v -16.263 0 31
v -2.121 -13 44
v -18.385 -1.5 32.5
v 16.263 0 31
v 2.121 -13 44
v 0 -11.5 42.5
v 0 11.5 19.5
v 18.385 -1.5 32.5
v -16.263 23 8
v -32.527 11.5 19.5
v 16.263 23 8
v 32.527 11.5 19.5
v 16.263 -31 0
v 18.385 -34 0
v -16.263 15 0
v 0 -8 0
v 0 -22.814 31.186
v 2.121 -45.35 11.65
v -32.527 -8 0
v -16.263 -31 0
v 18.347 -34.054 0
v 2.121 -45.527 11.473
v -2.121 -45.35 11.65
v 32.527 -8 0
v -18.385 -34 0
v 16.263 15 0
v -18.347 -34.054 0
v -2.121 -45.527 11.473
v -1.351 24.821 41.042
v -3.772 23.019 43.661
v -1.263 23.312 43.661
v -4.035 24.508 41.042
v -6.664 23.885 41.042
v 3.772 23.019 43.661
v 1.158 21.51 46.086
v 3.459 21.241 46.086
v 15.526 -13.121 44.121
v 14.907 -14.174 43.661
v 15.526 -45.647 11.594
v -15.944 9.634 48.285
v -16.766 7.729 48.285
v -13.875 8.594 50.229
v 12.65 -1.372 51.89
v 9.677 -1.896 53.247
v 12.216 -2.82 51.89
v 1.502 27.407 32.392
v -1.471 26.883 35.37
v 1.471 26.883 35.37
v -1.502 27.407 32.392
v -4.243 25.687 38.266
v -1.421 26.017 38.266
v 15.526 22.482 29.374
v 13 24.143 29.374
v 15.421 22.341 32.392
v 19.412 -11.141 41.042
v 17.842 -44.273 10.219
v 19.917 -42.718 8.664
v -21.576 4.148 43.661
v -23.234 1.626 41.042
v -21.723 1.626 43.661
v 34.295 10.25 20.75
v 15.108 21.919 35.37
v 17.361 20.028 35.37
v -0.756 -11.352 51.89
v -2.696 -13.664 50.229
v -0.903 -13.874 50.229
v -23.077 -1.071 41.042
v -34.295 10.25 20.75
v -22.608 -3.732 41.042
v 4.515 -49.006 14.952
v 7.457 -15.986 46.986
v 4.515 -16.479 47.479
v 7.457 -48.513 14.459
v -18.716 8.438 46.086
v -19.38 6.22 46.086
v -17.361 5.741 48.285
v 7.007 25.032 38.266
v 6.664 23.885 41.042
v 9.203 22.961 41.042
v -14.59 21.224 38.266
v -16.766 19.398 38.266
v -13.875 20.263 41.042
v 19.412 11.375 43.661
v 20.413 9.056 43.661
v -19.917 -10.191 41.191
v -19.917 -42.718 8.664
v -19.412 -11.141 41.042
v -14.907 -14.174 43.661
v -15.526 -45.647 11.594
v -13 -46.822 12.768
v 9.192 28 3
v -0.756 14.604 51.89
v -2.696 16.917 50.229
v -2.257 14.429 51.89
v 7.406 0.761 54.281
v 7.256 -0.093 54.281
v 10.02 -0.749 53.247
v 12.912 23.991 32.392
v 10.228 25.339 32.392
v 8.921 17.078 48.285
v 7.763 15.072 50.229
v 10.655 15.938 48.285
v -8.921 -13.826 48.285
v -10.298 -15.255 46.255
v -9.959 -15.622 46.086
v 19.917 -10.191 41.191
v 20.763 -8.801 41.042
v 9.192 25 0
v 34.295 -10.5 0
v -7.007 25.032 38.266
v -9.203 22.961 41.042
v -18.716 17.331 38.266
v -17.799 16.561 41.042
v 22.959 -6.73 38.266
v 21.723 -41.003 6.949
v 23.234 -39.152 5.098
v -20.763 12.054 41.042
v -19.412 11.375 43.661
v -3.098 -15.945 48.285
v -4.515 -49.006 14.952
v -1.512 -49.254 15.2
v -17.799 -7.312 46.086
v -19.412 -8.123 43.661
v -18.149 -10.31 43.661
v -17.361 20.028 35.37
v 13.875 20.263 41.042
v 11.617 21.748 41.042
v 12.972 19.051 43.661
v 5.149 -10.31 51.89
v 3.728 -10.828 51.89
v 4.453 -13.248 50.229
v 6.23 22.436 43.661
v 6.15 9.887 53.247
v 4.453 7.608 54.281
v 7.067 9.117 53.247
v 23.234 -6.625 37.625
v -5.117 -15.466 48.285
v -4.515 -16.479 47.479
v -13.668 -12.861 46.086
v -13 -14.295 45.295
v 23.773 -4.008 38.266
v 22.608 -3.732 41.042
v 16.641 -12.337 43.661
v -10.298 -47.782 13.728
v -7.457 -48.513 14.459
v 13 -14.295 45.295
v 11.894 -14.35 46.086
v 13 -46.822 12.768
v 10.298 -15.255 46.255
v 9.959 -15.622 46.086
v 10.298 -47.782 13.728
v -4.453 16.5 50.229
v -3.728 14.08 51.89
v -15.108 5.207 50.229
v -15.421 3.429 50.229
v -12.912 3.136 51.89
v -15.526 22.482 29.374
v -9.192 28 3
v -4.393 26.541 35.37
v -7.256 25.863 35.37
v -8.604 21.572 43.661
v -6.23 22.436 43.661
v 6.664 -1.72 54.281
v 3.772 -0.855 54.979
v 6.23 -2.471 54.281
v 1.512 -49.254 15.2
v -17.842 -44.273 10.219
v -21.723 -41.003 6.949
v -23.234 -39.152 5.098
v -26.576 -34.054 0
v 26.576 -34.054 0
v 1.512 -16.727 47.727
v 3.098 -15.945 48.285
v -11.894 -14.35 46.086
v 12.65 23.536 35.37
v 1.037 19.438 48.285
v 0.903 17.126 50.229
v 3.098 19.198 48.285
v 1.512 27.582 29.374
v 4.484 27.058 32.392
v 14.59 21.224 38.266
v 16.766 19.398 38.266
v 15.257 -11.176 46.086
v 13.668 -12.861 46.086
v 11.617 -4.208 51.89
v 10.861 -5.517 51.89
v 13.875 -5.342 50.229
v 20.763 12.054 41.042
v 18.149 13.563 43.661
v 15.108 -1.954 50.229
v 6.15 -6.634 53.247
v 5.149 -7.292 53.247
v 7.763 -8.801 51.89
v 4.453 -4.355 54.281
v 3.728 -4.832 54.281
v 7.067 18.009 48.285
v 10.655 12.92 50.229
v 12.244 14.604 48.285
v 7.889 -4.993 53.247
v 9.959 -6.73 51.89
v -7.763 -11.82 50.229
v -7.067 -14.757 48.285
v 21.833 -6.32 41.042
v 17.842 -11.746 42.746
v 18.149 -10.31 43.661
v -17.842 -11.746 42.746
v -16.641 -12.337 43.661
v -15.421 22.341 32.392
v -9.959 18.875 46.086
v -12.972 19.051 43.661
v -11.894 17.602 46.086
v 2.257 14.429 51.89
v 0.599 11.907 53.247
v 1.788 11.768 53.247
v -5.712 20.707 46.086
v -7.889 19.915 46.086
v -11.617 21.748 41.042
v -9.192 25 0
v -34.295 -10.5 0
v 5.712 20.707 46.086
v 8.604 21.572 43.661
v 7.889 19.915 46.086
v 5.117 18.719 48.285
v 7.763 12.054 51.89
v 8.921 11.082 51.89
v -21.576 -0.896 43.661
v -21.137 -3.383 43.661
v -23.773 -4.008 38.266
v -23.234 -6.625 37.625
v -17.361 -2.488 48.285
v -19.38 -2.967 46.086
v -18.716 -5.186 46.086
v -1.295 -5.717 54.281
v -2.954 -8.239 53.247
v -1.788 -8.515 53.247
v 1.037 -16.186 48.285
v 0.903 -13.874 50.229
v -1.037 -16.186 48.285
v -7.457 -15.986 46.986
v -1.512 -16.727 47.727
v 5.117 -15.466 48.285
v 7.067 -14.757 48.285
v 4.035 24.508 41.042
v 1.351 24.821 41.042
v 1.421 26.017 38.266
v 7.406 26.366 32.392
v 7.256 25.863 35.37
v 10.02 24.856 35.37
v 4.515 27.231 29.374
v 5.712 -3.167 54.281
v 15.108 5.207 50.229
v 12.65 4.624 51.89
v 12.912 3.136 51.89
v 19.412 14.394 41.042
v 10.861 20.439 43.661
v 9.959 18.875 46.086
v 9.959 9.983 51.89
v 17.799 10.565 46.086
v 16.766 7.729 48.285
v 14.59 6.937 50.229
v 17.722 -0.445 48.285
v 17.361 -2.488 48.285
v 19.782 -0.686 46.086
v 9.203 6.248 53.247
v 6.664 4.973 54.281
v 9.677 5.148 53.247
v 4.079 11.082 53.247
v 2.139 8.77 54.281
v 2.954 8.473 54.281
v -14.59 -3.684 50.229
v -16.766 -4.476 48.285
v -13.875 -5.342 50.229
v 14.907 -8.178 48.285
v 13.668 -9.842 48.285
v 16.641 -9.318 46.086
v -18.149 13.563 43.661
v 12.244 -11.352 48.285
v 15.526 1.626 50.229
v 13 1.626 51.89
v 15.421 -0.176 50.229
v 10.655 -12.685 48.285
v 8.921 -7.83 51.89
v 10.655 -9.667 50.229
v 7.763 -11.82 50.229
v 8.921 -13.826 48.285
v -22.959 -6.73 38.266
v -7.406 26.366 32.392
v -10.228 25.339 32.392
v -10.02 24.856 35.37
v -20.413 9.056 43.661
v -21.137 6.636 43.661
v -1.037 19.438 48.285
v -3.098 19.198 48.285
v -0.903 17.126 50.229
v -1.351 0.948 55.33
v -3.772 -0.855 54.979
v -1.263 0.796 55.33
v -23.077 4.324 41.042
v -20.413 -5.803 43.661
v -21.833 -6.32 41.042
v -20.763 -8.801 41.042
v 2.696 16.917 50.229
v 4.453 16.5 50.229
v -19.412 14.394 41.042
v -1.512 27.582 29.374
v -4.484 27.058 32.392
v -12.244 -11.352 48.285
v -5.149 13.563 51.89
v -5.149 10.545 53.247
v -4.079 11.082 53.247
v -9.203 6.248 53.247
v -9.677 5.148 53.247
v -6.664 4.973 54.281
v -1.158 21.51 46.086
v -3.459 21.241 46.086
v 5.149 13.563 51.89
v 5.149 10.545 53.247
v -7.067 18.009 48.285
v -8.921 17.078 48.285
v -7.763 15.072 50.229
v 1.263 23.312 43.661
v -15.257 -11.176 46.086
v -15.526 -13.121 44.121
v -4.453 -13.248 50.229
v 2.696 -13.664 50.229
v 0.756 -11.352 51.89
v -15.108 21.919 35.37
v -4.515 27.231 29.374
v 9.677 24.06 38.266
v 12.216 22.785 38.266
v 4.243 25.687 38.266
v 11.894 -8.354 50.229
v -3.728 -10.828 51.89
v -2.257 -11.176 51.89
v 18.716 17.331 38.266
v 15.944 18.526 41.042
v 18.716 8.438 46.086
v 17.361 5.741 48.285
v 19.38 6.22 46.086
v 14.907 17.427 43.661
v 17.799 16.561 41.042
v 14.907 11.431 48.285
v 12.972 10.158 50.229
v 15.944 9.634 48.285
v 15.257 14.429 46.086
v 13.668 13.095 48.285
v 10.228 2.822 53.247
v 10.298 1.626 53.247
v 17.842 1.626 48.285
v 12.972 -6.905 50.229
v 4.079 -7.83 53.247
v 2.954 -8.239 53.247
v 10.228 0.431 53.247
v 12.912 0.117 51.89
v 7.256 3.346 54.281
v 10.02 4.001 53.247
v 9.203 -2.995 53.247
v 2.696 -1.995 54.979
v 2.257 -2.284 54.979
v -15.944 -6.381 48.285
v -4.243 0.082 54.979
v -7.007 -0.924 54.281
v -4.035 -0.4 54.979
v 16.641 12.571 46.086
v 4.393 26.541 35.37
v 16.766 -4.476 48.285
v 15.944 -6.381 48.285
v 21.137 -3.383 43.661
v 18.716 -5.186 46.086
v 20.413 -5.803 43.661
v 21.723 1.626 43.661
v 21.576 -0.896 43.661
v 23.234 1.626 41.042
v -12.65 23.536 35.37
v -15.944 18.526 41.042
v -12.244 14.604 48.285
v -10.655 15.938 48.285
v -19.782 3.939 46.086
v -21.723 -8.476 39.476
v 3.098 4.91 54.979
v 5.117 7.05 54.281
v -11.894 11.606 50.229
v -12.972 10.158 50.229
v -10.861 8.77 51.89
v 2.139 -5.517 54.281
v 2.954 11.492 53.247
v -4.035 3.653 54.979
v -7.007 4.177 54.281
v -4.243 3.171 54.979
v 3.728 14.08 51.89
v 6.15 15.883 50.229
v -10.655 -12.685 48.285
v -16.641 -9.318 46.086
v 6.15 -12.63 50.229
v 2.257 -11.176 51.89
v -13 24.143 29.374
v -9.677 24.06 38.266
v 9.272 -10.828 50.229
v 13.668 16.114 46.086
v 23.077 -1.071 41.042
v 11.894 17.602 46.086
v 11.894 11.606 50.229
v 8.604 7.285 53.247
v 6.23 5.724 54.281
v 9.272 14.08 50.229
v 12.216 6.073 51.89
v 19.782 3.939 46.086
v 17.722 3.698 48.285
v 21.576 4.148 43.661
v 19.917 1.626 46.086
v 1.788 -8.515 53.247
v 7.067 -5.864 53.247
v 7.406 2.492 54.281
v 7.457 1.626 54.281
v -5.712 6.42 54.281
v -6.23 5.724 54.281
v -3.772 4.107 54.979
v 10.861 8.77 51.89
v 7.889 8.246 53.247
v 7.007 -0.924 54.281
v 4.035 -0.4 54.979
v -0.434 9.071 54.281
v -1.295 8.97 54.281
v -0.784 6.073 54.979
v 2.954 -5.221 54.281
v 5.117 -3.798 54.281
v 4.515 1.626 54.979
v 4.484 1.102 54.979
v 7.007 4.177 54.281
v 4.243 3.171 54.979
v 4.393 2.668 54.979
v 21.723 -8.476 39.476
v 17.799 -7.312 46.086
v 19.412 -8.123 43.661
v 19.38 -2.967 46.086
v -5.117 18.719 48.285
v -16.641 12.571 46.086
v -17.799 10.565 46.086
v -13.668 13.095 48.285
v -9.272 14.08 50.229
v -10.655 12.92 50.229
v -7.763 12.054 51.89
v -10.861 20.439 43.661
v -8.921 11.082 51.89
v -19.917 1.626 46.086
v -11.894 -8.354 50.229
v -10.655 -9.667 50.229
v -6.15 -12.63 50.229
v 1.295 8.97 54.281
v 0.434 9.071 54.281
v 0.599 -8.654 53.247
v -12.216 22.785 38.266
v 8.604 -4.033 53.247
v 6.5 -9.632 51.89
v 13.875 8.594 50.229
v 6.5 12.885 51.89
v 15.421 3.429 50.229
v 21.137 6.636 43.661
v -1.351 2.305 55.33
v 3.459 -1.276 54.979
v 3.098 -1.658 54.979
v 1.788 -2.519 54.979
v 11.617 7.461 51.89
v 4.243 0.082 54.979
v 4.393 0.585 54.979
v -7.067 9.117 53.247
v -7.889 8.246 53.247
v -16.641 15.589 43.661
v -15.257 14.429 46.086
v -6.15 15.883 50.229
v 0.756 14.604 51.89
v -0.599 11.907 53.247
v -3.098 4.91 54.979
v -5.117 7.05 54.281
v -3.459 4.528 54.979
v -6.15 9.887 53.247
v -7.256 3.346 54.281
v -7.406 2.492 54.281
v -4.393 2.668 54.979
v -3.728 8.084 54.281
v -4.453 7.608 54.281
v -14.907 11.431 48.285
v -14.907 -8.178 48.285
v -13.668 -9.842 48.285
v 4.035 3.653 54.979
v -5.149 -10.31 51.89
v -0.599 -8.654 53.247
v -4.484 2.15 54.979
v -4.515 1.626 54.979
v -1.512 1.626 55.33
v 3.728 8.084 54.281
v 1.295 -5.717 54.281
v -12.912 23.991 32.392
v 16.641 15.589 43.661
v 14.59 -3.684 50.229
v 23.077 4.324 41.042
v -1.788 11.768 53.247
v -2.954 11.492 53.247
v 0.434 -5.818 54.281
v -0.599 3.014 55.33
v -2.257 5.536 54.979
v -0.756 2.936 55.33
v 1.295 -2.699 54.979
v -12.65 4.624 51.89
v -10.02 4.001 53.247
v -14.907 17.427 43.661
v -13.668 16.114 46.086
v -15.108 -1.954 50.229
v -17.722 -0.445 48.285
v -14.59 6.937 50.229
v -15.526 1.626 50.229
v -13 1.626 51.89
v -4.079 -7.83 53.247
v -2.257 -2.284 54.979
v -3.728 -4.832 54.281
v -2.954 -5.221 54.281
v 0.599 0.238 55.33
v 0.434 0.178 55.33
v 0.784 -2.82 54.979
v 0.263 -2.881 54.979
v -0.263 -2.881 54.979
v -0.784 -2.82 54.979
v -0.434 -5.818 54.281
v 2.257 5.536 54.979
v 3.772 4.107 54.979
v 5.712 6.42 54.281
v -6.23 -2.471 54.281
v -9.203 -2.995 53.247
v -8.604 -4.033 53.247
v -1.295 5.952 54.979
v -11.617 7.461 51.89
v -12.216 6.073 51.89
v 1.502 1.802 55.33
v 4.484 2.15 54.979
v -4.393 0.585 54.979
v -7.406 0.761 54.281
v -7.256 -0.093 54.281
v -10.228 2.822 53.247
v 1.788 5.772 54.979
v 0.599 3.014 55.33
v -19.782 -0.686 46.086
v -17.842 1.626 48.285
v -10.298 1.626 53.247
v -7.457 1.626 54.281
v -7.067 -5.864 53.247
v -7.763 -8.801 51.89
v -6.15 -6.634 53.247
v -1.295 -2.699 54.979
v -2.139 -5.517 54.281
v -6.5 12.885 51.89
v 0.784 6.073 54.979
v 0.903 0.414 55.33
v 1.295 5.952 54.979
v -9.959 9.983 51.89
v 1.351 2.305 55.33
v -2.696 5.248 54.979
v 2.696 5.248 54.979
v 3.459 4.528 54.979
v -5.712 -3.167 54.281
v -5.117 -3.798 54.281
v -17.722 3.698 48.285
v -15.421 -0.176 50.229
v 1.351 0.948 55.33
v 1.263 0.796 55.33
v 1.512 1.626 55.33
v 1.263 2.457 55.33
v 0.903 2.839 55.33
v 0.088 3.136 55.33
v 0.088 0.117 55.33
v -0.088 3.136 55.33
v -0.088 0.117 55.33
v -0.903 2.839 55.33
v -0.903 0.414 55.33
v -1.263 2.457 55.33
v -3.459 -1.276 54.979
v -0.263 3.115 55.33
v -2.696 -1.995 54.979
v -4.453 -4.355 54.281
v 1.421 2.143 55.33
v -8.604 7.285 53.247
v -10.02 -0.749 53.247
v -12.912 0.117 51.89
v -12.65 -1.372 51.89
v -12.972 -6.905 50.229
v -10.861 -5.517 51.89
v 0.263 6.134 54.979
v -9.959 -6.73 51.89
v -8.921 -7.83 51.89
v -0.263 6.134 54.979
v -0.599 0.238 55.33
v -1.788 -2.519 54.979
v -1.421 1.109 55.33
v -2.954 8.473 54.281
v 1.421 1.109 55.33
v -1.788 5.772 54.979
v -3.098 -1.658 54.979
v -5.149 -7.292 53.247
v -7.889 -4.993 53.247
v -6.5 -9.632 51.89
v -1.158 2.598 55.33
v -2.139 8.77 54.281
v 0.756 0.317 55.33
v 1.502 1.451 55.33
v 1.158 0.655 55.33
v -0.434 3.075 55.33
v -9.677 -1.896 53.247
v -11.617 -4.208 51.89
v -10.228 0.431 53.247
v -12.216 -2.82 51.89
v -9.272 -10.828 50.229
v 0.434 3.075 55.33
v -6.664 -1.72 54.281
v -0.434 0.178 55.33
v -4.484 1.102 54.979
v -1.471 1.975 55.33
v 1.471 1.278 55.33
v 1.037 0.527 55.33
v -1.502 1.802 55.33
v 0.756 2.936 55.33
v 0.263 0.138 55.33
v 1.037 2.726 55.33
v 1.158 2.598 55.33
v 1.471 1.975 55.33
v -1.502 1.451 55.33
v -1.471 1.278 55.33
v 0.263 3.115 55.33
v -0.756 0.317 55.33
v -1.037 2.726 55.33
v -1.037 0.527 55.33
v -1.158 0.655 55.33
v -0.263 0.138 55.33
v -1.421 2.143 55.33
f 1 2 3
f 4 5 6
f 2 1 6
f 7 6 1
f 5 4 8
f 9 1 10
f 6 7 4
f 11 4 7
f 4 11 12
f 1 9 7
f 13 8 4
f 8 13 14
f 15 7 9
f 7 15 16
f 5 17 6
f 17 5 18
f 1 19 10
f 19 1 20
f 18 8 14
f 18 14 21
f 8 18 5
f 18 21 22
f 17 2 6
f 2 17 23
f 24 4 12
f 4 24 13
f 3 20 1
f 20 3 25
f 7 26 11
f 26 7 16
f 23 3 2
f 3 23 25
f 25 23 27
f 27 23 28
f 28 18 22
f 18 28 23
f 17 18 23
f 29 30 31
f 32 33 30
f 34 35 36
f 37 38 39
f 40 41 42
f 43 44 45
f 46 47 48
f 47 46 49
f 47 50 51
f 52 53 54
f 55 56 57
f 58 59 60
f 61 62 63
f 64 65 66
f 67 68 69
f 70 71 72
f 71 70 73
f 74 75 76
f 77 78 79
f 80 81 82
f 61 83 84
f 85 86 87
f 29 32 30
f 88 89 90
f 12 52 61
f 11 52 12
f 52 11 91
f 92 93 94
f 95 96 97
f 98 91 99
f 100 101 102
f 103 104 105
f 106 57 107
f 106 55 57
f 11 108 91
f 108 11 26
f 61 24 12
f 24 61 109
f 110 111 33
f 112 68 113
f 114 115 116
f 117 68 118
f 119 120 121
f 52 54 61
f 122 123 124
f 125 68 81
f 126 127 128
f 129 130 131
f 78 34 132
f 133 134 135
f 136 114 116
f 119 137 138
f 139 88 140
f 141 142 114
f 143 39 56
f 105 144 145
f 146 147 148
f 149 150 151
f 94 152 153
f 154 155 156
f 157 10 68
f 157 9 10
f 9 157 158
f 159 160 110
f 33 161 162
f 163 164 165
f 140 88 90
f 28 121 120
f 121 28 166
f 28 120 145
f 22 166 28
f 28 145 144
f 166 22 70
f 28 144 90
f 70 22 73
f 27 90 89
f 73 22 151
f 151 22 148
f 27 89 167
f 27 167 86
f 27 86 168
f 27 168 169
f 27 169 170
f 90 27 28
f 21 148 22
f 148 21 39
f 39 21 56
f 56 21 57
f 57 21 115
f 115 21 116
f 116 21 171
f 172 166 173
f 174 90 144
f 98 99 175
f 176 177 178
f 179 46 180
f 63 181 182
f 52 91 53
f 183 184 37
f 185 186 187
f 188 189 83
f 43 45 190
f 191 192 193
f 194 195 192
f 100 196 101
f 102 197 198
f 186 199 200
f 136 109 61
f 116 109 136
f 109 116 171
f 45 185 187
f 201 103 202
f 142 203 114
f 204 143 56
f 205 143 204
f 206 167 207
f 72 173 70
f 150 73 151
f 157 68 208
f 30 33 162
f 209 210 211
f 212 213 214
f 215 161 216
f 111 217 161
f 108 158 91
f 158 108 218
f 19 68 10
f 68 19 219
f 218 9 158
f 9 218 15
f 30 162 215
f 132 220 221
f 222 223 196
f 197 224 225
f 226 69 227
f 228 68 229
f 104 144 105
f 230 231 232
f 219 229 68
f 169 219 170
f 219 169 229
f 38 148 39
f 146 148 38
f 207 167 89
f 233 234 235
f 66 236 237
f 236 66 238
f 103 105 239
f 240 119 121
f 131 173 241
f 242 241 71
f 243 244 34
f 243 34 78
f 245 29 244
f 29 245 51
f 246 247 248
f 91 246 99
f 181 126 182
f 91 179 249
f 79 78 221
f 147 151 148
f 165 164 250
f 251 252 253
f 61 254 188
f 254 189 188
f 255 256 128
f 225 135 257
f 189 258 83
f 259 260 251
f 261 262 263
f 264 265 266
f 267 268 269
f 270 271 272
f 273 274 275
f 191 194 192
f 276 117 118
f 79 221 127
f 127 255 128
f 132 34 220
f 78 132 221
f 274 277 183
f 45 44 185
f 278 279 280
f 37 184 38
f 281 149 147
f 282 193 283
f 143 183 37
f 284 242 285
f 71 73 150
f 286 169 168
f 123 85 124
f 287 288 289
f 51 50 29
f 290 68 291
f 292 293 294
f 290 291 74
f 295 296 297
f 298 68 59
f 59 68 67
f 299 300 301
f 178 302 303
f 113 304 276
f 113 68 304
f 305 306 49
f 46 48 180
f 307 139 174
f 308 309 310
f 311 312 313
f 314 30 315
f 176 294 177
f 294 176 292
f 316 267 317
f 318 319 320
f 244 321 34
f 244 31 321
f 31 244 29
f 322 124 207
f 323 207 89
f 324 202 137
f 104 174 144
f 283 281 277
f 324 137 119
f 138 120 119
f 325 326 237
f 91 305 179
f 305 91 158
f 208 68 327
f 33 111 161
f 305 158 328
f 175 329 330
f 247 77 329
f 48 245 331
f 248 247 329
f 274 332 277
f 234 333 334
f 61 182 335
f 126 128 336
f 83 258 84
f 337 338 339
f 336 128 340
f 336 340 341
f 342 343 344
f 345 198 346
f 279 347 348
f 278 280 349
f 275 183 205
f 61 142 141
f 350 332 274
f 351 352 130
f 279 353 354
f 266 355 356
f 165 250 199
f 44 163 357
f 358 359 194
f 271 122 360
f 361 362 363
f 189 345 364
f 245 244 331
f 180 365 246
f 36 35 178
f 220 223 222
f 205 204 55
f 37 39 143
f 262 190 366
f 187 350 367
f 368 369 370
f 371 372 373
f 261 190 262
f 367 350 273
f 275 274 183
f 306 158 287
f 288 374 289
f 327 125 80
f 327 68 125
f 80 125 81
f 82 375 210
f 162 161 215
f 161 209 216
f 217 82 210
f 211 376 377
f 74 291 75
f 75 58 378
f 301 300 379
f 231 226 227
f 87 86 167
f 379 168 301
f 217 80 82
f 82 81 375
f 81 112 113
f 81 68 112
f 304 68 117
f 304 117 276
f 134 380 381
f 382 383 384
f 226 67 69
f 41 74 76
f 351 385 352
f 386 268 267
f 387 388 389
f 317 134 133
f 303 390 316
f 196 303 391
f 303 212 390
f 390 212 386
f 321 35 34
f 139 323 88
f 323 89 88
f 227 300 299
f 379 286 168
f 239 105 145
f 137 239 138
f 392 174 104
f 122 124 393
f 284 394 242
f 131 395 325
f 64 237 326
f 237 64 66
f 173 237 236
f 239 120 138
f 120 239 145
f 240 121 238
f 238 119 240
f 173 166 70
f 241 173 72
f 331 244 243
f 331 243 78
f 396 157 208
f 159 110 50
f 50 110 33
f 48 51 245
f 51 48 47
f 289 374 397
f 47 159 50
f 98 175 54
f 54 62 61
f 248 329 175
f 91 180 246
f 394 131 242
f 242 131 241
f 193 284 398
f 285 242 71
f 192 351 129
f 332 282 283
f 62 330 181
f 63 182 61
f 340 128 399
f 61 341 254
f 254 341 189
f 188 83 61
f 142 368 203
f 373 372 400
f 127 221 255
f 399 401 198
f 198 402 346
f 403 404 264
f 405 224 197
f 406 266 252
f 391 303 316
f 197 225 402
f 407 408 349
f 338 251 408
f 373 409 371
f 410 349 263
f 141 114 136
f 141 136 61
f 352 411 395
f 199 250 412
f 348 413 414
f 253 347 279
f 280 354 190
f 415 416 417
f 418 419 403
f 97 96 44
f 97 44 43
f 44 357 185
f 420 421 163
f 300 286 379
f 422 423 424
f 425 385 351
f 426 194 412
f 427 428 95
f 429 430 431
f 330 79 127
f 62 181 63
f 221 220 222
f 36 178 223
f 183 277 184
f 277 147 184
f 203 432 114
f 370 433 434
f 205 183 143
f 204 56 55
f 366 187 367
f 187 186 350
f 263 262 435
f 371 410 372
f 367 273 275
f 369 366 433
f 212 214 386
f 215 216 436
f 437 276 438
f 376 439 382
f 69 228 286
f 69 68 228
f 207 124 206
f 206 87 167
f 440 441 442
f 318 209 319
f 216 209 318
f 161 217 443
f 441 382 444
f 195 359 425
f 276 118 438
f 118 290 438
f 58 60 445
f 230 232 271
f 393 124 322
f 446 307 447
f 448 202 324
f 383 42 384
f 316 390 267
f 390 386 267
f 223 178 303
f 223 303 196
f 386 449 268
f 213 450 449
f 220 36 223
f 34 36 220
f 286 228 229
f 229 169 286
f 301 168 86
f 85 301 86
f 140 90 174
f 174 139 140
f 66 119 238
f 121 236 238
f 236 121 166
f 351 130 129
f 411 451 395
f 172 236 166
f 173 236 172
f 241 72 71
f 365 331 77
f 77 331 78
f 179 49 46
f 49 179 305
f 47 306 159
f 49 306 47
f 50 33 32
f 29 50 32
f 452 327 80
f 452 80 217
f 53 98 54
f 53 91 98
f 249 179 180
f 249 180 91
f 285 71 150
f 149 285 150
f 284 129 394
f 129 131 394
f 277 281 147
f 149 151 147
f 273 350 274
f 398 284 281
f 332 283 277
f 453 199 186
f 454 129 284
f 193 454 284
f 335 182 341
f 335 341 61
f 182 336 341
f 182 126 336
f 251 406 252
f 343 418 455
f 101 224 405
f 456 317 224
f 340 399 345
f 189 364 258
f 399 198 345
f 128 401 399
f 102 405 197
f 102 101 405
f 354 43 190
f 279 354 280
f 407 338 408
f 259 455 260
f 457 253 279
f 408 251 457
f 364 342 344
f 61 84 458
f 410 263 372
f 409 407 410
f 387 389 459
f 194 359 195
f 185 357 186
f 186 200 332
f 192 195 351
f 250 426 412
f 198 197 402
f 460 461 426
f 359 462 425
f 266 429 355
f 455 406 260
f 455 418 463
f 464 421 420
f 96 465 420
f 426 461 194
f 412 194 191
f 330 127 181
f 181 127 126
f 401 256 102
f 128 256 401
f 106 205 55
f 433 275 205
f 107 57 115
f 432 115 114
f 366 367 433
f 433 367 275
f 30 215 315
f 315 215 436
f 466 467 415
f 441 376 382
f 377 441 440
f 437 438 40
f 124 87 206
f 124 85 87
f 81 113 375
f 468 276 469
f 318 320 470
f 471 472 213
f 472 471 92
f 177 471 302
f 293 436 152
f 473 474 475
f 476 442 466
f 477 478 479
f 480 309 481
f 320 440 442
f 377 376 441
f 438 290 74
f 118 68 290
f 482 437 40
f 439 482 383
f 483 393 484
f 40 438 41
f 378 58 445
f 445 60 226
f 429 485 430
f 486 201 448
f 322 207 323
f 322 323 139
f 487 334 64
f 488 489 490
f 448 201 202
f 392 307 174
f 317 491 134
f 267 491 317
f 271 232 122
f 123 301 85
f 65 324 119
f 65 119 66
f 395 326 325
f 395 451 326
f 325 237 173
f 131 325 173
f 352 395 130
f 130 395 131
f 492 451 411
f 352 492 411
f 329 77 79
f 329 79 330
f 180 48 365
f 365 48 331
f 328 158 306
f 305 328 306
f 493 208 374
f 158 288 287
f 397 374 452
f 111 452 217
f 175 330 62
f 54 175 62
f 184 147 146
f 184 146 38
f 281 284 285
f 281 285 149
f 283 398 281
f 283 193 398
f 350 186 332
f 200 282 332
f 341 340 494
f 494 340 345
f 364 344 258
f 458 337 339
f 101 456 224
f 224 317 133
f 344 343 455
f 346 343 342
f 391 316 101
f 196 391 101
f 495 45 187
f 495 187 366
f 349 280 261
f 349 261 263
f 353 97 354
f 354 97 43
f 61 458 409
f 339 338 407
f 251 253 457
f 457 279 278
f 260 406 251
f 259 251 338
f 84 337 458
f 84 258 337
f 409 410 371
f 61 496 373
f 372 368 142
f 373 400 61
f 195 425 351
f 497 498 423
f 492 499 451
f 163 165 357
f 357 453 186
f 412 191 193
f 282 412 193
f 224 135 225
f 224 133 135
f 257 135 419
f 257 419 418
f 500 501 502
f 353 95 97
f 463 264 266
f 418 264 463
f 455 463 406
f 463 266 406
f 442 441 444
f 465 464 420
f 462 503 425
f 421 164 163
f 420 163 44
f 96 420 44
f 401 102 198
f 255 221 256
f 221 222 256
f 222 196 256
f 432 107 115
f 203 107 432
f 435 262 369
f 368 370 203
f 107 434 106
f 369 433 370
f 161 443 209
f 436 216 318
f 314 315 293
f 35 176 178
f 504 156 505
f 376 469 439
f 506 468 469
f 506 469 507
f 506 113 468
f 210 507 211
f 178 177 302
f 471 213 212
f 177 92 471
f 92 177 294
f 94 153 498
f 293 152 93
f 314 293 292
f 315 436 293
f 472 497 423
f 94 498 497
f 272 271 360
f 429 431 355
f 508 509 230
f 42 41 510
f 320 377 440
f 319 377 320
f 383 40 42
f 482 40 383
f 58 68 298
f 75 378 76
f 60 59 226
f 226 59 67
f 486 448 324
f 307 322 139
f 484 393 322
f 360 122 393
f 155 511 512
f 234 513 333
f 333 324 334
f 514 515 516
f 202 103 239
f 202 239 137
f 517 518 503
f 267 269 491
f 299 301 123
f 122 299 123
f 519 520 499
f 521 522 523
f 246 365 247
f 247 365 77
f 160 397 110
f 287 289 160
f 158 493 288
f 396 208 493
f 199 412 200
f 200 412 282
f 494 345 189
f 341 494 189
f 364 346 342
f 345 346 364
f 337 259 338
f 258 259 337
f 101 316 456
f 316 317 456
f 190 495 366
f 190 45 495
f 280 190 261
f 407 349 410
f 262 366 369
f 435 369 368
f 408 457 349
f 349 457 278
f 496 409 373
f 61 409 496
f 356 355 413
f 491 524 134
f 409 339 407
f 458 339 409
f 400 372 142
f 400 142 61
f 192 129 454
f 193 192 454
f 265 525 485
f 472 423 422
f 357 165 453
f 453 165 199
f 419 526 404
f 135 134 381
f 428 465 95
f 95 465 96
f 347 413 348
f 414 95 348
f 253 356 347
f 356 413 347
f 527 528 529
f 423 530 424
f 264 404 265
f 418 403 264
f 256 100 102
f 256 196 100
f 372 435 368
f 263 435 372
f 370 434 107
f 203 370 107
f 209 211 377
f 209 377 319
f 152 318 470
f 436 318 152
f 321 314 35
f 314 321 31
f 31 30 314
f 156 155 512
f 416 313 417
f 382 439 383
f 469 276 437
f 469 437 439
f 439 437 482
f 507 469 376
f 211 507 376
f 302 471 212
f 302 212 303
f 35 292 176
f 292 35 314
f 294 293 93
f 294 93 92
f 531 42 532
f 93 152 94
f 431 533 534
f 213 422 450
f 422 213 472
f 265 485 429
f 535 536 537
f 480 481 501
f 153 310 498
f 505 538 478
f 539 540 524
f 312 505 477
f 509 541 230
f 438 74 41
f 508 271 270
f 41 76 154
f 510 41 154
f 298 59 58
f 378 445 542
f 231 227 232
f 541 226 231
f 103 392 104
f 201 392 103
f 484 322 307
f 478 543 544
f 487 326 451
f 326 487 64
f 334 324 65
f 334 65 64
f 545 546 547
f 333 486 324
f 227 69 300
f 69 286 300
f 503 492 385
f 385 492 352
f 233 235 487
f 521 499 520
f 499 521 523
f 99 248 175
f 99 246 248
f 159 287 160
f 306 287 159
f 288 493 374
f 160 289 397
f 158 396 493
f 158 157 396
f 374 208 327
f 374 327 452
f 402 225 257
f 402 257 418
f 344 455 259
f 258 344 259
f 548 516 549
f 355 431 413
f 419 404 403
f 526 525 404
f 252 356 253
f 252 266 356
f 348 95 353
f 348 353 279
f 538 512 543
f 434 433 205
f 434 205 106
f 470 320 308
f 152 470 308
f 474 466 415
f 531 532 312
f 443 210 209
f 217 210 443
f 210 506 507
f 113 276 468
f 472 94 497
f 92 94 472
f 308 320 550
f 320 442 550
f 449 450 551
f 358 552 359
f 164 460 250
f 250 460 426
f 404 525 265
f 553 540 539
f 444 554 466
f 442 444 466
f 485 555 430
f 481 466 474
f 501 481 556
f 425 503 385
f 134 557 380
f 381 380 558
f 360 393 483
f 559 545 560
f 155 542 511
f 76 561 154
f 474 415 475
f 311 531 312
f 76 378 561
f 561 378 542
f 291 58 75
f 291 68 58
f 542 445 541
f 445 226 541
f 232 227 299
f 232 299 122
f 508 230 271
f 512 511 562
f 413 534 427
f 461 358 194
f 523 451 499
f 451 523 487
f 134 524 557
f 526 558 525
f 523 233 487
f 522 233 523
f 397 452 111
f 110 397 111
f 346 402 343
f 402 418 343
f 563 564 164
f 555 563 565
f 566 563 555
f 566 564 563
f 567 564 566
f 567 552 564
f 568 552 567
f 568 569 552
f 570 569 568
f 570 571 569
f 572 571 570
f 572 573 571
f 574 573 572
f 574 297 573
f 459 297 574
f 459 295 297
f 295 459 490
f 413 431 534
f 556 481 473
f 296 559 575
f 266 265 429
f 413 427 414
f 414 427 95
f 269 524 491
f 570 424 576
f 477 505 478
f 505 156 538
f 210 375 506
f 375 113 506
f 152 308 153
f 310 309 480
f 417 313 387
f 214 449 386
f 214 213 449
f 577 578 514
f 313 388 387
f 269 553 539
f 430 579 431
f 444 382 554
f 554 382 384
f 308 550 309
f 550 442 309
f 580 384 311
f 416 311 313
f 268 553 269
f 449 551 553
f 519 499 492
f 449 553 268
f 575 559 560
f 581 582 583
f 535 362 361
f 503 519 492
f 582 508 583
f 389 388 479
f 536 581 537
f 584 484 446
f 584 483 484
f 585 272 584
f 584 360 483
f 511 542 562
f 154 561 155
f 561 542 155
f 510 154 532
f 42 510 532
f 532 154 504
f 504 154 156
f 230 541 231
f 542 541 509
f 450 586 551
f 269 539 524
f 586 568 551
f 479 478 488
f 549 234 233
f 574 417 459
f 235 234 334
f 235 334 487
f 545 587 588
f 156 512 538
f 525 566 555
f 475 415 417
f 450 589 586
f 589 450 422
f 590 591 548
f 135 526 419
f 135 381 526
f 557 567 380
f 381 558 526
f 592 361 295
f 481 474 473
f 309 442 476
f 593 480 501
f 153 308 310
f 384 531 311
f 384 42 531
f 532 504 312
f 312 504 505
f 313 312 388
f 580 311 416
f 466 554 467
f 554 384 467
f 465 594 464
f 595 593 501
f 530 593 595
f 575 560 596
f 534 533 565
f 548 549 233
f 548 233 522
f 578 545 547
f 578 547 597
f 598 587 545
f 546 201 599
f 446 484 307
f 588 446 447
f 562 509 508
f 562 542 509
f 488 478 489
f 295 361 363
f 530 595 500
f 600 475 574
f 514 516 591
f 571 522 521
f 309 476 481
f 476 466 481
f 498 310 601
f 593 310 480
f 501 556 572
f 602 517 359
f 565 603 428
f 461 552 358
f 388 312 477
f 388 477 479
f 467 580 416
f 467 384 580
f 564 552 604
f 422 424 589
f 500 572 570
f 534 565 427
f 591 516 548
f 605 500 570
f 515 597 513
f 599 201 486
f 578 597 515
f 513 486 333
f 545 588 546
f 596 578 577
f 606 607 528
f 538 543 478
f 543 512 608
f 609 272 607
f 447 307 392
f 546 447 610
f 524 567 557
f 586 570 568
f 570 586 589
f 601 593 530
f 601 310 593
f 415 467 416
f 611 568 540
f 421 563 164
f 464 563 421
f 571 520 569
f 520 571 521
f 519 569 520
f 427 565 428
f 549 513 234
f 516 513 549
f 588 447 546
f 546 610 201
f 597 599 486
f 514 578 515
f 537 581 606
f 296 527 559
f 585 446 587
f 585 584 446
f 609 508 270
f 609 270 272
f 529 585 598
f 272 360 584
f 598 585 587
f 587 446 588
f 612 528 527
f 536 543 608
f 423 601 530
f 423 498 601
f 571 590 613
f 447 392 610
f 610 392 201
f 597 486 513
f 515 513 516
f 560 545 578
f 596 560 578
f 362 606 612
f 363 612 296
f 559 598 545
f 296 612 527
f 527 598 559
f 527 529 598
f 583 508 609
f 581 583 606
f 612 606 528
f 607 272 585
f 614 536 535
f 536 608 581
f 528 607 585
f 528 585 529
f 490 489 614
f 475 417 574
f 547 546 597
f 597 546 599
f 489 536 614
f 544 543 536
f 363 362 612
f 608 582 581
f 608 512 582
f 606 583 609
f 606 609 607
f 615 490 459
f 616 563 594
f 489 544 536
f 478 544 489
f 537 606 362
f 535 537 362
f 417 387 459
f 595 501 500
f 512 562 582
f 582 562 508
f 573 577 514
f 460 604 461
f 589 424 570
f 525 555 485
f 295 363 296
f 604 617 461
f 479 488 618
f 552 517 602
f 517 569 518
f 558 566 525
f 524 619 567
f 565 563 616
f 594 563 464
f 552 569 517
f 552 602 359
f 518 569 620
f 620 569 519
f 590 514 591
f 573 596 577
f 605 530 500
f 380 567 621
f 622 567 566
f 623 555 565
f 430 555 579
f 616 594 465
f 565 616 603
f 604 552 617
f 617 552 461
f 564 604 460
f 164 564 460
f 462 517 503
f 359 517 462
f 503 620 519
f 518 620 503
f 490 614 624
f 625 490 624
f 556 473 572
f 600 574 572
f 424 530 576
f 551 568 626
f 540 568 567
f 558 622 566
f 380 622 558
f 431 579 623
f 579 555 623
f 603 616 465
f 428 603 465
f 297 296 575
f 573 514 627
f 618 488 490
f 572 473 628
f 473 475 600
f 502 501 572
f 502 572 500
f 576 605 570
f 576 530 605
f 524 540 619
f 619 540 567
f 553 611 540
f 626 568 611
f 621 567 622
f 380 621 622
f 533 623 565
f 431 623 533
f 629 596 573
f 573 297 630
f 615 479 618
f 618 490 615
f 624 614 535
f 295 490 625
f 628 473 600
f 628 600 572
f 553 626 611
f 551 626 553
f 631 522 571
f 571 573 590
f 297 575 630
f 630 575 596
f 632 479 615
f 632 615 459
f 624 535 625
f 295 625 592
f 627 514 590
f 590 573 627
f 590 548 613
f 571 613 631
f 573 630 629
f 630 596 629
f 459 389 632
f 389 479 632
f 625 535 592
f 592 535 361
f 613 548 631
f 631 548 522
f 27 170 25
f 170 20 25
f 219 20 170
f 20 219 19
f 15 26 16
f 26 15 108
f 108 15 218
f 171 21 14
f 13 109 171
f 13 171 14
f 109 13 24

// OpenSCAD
left = -1;
right = 1;

board_thickness = 23;
board_offset    = 3;
guard_diam      = 36;
inner_wall      = 10;
side_thickness  = 23;
side_length     = 50;
side_height     = 50;

resolution = 18*3;

module board() {
  translate([0,25,-25])
    cube([side_thickness,side_length,side_height],center=true);
}

module guard() {
  module body() {
    hull() {
      translate([0,board_thickness*.1,0]) {
        rotate([45,0,0])
          sphere(r=26,$fn=resolution);

        translate([0,0,-side_thickness])
          cylinder(r=26,h=side_thickness*2,center=true,$fn=resolution);
      }

      for (side = [left, right]) {
        rotate([0,0,45*side]) {
          translate([inner_wall*.375*side,10+side_thickness-board_thickness/2-inner_wall/2,-side_thickness])
            cube([board_thickness+inner_wall*1.25,side_thickness*2+inner_wall-20,side_thickness*2],center=true);
        }
      }
    }
  }

  module holes() {
    // bed boards
    for (side = [left,right]) {
      rotate([0,0,-45*side])
        translate([0,25-board_thickness/2-3,-side_height/2]) {
          cube([side_thickness,side_length,side_height],center=true);
        }
    }

    hull() {
      for (side = [left,right]) {
        rotate([0,0,-45*side])
          translate([0,-9.5,-side_height])
            cube([side_thickness,10,8.5],center=true);
      }

      rotate([0,0,45])
        translate([-side_thickness/2+4,-side_thickness/2+4,-side_height+30])
          cube([8,8,8],center=true);
    }
  }

  difference() {
    body();
    holes();
  }
}

module printable_opening_down() {
  difference() {
    translate([0,0,31])
      rotate([-45,0,0])
          guard();
    translate([0,0,-50])
      cube([100,100,100],center=true);
  }
}

//guard();
printable_opening_down();
